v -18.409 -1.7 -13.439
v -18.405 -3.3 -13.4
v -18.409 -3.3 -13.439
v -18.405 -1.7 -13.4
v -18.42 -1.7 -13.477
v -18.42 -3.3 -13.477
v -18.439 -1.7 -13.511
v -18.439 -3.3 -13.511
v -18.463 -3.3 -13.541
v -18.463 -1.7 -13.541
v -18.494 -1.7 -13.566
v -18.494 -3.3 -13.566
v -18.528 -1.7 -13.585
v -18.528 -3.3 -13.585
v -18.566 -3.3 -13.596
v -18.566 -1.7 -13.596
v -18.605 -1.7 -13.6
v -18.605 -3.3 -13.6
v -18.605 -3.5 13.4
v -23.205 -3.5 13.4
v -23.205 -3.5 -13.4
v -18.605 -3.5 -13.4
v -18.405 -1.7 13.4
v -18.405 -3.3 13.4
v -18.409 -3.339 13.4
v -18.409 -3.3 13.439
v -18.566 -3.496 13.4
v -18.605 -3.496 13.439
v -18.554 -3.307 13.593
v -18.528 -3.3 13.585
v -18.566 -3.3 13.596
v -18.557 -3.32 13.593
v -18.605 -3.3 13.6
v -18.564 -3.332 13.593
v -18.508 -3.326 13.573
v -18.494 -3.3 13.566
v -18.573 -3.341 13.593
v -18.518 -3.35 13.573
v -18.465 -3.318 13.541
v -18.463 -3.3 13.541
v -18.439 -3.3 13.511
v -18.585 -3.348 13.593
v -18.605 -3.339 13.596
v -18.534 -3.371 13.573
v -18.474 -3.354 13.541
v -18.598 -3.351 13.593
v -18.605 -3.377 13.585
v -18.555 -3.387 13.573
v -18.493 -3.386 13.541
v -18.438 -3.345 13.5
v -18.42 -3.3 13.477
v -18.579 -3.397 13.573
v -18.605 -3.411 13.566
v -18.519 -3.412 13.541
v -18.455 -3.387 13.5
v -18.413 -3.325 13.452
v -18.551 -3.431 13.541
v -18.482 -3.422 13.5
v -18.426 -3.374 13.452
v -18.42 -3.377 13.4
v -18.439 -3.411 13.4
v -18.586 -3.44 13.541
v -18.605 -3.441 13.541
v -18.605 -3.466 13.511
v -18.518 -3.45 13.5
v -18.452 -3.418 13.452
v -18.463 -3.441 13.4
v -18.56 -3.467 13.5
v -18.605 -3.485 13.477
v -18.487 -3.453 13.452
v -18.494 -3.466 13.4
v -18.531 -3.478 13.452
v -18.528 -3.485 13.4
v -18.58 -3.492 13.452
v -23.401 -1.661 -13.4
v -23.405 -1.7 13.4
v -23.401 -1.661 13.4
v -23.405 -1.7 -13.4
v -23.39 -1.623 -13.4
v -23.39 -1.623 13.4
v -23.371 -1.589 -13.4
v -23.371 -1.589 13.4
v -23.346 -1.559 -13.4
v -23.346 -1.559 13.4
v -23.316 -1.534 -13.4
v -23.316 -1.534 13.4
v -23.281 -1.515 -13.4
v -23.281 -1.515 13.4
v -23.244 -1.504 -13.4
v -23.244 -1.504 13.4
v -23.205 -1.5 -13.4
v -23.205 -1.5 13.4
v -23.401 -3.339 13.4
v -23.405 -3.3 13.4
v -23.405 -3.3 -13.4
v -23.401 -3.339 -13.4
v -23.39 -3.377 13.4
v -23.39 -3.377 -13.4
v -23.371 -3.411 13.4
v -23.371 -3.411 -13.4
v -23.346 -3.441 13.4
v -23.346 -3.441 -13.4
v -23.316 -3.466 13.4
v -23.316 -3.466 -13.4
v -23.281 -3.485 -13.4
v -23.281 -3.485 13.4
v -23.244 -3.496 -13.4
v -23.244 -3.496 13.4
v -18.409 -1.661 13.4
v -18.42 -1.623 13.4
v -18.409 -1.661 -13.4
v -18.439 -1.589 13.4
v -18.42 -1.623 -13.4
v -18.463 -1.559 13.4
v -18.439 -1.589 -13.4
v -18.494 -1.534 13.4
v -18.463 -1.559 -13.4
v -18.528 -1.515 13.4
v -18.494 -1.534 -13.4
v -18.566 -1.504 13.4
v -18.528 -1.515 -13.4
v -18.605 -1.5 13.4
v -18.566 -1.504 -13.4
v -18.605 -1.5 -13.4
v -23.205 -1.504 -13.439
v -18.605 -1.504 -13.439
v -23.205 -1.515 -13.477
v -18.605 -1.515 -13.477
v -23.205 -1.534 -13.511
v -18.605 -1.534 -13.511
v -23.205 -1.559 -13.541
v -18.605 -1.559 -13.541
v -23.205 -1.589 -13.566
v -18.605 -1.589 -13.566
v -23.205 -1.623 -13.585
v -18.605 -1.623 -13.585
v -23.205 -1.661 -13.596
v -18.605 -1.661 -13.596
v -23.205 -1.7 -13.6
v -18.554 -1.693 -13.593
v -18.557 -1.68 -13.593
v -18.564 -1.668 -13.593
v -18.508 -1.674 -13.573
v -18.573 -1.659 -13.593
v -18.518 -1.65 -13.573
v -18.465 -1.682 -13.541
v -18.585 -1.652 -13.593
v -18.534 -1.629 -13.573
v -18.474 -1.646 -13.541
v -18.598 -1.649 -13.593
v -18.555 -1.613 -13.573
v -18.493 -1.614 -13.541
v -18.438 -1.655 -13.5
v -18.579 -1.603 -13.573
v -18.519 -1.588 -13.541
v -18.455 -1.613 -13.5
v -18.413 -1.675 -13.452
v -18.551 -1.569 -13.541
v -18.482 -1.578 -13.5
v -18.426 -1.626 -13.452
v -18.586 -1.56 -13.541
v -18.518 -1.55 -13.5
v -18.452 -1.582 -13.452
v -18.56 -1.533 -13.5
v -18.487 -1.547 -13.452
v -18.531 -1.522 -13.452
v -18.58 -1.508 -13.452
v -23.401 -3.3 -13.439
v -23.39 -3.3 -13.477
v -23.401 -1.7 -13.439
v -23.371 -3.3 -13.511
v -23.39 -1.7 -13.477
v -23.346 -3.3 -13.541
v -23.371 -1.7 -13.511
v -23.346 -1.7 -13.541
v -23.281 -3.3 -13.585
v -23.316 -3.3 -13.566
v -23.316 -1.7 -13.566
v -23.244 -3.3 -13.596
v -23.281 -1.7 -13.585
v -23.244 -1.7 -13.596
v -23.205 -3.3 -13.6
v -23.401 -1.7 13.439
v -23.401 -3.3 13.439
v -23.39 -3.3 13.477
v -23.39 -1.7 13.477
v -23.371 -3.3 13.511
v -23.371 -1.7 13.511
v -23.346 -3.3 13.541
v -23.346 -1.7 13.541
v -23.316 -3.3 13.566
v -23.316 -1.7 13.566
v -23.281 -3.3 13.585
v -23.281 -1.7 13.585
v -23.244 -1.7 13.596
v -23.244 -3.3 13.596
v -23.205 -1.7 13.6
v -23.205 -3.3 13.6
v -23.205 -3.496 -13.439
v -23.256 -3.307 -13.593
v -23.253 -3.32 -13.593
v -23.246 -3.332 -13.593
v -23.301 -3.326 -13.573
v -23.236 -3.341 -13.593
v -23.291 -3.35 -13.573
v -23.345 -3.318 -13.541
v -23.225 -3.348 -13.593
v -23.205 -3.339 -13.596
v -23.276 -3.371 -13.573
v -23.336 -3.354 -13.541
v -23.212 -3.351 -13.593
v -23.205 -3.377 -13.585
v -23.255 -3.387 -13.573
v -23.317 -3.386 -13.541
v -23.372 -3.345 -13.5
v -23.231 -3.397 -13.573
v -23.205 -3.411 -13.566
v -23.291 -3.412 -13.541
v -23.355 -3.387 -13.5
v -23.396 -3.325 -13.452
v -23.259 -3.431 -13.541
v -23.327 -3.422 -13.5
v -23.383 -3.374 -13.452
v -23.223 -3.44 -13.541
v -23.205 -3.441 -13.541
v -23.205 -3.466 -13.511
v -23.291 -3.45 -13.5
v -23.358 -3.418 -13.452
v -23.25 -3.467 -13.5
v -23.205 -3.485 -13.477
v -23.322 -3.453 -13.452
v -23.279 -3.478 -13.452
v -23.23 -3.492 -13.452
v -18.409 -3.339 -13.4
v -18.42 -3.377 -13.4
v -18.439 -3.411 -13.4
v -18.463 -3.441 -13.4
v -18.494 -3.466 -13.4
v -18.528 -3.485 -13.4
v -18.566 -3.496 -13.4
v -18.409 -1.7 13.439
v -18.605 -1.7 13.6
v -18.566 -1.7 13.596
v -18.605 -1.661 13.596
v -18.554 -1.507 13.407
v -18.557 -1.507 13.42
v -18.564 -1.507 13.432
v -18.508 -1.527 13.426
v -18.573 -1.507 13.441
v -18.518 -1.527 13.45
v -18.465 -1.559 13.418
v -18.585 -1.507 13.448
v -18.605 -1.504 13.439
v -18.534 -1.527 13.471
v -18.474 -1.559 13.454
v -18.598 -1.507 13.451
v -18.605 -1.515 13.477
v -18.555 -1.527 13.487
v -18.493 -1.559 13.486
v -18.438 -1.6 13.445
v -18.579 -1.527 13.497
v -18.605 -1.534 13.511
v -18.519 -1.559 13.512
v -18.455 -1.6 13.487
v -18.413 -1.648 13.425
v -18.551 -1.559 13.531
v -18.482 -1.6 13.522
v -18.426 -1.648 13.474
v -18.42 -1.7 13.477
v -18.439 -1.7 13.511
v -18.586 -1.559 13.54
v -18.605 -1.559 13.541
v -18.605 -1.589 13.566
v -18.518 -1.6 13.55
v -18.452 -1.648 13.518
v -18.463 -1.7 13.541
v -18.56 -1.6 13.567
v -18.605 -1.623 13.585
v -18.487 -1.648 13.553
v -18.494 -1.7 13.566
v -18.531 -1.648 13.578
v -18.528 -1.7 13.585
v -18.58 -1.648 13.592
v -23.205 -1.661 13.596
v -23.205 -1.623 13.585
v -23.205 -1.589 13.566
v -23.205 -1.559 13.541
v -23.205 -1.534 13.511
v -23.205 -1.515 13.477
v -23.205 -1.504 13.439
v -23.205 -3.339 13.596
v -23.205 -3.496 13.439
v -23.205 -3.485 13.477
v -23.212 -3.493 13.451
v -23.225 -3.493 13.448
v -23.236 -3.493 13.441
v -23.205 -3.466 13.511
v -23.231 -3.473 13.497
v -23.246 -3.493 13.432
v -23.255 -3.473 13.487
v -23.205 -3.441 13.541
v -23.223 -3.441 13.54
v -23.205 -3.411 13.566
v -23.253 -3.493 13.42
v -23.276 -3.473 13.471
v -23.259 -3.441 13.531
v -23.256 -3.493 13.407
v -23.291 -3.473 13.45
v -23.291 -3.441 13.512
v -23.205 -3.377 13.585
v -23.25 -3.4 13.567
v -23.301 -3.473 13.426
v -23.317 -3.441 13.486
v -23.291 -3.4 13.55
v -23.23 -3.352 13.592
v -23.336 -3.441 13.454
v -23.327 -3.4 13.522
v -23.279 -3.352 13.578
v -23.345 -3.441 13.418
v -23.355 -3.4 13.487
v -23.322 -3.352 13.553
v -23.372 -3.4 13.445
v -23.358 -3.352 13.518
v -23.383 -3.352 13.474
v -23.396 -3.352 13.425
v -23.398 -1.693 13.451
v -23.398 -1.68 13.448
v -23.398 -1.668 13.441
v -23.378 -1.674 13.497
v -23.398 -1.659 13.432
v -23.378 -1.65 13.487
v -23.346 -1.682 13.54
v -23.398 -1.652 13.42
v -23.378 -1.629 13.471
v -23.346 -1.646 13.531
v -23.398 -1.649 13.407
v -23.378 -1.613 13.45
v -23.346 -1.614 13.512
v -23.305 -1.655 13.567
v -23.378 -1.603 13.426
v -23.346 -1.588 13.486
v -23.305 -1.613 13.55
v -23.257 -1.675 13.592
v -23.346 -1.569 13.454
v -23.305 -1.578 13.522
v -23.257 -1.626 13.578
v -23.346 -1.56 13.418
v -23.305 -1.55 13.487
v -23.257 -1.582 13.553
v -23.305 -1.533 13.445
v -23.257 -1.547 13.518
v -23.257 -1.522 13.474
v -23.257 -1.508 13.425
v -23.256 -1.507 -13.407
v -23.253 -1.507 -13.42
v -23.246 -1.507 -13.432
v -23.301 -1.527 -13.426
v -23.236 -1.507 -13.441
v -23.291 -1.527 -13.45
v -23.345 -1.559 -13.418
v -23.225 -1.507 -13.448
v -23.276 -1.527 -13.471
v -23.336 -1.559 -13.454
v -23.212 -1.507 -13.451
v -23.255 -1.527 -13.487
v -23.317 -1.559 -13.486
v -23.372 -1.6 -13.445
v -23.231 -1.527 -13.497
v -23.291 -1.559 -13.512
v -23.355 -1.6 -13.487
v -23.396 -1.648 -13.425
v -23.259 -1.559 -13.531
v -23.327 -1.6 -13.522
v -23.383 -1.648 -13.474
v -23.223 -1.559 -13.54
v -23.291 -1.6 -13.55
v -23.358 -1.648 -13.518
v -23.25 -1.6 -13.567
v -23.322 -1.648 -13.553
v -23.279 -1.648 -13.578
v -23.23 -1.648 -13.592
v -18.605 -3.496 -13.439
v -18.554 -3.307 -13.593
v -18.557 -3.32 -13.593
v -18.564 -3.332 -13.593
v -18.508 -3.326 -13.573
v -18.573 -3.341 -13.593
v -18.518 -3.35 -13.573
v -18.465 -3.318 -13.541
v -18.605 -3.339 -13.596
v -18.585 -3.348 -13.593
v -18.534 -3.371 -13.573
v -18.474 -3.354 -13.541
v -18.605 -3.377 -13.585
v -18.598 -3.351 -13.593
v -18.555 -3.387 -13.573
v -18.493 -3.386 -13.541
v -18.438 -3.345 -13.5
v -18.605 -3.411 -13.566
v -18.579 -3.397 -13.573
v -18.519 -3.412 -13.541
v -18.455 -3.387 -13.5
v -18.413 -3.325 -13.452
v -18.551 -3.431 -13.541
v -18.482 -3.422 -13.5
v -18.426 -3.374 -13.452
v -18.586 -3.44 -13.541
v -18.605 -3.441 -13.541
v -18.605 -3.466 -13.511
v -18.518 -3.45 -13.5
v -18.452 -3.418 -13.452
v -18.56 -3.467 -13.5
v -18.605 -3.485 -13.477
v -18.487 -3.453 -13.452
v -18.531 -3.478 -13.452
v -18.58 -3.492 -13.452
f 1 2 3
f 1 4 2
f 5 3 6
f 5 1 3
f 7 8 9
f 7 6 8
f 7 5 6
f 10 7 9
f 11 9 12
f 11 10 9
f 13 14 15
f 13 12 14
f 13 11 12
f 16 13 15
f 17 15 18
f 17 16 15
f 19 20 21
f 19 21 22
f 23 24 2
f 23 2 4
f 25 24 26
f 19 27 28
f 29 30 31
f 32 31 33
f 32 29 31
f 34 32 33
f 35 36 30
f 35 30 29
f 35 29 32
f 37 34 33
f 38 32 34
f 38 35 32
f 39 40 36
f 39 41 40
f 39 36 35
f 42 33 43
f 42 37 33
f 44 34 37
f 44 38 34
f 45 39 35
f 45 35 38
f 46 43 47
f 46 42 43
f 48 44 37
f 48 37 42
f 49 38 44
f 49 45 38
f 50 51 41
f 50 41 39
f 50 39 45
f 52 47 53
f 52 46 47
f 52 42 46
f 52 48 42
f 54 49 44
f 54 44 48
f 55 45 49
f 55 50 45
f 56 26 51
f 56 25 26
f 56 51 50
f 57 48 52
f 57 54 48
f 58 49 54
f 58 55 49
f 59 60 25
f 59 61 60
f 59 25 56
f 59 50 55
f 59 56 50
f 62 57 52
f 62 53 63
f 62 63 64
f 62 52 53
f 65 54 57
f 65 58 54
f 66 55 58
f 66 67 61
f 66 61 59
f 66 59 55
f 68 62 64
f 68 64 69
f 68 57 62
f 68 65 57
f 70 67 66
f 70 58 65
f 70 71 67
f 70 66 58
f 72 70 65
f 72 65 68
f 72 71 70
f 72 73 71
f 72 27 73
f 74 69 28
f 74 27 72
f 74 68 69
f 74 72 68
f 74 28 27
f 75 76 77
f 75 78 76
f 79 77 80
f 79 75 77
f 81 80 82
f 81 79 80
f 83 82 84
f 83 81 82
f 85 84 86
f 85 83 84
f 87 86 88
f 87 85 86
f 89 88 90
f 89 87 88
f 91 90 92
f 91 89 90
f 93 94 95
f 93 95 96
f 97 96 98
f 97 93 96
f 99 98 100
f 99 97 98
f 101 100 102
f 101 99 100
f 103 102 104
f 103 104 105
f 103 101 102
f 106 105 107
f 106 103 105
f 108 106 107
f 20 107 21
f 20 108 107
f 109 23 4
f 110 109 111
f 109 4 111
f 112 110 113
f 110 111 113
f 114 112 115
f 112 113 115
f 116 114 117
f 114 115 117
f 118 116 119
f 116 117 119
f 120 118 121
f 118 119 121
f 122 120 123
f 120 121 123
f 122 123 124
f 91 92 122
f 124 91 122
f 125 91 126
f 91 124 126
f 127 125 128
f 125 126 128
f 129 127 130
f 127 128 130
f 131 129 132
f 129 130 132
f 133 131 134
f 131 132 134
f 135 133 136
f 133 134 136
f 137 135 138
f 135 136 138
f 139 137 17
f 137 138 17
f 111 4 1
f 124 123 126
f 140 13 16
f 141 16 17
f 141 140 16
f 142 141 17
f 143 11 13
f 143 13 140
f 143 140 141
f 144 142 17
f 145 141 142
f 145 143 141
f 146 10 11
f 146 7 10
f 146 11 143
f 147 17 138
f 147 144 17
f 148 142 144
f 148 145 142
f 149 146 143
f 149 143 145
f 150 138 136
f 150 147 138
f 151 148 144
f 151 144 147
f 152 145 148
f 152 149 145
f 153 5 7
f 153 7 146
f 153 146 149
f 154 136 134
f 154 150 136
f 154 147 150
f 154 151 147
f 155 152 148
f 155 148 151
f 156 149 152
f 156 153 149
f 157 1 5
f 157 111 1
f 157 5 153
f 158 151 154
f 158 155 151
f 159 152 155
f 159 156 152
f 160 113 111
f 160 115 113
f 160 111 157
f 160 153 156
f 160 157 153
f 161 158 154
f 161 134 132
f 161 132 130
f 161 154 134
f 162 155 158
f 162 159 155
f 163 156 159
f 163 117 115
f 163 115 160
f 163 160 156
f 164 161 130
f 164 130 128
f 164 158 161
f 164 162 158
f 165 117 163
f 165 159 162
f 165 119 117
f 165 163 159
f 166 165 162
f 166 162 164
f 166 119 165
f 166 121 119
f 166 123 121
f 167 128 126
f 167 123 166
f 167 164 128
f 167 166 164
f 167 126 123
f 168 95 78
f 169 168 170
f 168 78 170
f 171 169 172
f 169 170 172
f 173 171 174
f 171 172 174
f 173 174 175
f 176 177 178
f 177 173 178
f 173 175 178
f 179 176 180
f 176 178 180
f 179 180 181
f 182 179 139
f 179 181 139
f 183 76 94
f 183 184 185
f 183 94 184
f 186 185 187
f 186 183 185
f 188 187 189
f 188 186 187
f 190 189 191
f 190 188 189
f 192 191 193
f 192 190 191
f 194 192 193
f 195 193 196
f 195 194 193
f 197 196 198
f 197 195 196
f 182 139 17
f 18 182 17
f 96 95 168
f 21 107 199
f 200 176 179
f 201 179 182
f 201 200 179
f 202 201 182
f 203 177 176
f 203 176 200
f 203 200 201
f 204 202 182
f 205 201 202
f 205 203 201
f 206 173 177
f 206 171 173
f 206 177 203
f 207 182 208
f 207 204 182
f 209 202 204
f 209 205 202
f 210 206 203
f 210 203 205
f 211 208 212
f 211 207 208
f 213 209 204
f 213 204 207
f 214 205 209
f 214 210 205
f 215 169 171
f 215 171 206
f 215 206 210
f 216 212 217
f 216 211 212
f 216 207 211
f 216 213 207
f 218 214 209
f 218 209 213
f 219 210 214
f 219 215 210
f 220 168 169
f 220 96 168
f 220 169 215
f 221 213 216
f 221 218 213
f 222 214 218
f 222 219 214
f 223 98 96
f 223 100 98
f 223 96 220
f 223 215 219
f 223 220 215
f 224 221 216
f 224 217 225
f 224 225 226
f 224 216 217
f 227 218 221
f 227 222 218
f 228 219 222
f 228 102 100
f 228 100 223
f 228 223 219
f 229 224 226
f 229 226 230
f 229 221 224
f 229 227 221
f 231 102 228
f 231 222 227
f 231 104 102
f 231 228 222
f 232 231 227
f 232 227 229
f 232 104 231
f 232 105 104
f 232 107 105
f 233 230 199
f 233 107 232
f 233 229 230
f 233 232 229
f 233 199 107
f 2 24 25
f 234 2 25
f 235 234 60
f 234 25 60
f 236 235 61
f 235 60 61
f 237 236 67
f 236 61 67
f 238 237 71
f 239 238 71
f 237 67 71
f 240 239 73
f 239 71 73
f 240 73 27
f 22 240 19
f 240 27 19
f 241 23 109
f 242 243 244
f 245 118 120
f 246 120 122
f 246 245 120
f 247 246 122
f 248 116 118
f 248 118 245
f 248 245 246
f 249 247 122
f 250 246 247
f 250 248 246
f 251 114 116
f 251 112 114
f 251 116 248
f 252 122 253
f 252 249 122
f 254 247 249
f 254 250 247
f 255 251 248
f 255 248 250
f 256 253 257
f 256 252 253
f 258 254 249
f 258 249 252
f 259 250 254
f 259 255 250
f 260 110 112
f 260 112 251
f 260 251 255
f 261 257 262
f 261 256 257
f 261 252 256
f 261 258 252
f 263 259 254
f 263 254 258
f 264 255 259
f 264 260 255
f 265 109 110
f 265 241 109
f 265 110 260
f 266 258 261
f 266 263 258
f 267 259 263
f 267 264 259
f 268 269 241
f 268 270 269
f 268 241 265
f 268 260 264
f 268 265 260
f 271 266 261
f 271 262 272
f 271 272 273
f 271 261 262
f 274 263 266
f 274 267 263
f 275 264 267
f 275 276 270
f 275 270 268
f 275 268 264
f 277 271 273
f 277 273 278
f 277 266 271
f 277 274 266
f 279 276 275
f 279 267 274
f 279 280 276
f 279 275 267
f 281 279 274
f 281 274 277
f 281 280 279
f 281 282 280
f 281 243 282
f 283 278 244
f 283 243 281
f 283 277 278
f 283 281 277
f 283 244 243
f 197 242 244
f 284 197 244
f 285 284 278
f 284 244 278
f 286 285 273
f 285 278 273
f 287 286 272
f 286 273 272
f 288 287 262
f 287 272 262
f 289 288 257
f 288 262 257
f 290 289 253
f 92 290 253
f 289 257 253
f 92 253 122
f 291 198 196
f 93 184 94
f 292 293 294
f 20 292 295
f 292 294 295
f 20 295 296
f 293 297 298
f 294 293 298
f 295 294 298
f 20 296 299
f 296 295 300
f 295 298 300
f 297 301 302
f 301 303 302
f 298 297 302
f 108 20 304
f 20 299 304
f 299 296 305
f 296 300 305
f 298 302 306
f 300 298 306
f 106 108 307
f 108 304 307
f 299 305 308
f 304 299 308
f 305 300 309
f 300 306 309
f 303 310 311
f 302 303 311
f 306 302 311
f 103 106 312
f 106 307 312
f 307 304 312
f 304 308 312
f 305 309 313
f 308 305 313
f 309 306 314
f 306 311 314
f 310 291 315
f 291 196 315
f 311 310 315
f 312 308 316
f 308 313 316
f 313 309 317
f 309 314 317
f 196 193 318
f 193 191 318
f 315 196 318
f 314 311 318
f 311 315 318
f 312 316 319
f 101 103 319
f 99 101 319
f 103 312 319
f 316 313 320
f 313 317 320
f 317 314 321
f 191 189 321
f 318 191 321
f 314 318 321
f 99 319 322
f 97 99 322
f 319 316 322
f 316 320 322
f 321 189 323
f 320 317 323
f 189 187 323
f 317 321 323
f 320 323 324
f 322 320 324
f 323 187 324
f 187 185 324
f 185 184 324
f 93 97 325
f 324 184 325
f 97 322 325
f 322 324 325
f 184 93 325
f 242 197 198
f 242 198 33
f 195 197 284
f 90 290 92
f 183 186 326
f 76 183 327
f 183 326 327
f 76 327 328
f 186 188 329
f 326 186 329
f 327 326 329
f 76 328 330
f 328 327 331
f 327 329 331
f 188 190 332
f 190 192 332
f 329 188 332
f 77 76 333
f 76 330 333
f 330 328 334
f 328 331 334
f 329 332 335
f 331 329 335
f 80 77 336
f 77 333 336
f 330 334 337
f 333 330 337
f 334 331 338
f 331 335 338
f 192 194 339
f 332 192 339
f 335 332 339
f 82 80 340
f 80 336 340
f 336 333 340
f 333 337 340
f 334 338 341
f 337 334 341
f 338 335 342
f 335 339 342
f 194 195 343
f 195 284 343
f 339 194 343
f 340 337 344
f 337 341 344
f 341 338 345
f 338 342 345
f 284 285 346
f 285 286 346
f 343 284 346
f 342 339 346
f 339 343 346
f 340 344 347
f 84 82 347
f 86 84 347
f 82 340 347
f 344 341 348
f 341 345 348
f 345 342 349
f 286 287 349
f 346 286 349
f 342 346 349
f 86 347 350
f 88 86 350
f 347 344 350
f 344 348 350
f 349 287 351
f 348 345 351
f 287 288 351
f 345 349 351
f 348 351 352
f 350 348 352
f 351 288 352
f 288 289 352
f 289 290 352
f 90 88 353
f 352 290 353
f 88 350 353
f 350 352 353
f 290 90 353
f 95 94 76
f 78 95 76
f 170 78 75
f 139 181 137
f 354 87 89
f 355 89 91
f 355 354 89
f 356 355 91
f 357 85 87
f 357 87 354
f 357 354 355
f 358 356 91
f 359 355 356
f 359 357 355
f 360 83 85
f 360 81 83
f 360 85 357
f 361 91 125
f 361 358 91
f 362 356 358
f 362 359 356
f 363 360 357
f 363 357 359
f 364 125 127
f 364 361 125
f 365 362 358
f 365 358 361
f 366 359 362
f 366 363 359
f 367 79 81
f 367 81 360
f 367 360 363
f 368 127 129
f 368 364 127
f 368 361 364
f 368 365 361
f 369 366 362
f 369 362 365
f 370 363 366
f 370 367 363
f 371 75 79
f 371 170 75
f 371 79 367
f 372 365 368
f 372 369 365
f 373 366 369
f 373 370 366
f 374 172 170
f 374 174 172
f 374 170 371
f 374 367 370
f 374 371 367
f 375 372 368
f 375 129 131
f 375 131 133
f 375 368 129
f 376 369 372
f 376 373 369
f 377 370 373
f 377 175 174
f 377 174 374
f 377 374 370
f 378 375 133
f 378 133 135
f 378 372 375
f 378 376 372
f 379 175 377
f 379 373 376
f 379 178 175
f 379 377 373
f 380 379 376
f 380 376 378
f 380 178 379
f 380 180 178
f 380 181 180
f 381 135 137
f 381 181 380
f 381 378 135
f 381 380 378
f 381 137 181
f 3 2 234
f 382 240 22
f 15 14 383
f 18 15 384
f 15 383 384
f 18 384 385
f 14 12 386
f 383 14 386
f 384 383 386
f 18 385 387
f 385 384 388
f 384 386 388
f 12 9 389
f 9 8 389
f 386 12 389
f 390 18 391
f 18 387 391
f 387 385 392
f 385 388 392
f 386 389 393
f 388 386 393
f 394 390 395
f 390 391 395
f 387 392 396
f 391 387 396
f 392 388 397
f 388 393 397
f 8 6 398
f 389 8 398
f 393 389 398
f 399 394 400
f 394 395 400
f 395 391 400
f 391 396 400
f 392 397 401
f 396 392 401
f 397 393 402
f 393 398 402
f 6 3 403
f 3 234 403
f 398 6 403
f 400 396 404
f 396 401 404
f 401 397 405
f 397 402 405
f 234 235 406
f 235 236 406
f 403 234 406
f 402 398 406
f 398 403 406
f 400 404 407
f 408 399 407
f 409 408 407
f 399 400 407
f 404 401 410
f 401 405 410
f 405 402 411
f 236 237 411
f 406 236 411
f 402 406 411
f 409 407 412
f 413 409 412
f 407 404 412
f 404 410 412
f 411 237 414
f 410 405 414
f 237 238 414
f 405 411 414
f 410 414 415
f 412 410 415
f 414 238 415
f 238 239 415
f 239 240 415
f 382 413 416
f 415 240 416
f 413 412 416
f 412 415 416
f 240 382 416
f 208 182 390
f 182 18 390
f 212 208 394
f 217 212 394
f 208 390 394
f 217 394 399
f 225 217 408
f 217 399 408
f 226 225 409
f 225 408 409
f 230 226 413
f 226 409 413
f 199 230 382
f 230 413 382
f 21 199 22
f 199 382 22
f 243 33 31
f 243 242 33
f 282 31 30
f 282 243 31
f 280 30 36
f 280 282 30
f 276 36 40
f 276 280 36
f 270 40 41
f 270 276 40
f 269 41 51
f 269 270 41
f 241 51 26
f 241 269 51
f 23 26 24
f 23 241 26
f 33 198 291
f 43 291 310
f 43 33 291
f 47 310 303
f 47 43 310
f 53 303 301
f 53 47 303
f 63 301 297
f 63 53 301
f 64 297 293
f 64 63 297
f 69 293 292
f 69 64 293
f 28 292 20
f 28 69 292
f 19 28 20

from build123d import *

# Parameters (mm, degrees)
F1_W     = 5
F1_H     = 2
F2_DEPTH = 13.6
F4_R     = 0.2


with BuildPart() as f2:
    # F1 (on Top) → F2 (new body)
    with BuildSketch(Plane.XY):
        with Locations((-20.9048481555, -2.5)):
            Rectangle(F1_W, F1_H)
    extrude(amount=F2_DEPTH)

    # F3: F2 across plane


with BuildPart() as f2_1:
    add(f2.part)
    add(f2.part.mirror(Plane.XY))

    # F4
    f4_edges = [f2_1.edges().sort_by_distance(p)[0] for p in [
        (-18.404848, -3.5, 0),
        (-18.404848, -2.5, 13.6),
        (-18.404848, -1.5, 0),
        (-18.404848, -2.5, -13.6),
        (-20.904848, -1.5, 13.6),
        (-23.404848, -2.5, 13.6),
        (-20.904848, -3.5, 13.6),
        (-23.404848, -3.5, 0),
        (-23.404848, -2.5, -13.6),
        (-23.404848, -1.5, 0),
        (-20.904848, -1.5, -13.6),
        (-20.904848, -3.5, -13.6),
    ]]
    fillet(f4_edges, radius=F4_R)


solid = f2_1.part
